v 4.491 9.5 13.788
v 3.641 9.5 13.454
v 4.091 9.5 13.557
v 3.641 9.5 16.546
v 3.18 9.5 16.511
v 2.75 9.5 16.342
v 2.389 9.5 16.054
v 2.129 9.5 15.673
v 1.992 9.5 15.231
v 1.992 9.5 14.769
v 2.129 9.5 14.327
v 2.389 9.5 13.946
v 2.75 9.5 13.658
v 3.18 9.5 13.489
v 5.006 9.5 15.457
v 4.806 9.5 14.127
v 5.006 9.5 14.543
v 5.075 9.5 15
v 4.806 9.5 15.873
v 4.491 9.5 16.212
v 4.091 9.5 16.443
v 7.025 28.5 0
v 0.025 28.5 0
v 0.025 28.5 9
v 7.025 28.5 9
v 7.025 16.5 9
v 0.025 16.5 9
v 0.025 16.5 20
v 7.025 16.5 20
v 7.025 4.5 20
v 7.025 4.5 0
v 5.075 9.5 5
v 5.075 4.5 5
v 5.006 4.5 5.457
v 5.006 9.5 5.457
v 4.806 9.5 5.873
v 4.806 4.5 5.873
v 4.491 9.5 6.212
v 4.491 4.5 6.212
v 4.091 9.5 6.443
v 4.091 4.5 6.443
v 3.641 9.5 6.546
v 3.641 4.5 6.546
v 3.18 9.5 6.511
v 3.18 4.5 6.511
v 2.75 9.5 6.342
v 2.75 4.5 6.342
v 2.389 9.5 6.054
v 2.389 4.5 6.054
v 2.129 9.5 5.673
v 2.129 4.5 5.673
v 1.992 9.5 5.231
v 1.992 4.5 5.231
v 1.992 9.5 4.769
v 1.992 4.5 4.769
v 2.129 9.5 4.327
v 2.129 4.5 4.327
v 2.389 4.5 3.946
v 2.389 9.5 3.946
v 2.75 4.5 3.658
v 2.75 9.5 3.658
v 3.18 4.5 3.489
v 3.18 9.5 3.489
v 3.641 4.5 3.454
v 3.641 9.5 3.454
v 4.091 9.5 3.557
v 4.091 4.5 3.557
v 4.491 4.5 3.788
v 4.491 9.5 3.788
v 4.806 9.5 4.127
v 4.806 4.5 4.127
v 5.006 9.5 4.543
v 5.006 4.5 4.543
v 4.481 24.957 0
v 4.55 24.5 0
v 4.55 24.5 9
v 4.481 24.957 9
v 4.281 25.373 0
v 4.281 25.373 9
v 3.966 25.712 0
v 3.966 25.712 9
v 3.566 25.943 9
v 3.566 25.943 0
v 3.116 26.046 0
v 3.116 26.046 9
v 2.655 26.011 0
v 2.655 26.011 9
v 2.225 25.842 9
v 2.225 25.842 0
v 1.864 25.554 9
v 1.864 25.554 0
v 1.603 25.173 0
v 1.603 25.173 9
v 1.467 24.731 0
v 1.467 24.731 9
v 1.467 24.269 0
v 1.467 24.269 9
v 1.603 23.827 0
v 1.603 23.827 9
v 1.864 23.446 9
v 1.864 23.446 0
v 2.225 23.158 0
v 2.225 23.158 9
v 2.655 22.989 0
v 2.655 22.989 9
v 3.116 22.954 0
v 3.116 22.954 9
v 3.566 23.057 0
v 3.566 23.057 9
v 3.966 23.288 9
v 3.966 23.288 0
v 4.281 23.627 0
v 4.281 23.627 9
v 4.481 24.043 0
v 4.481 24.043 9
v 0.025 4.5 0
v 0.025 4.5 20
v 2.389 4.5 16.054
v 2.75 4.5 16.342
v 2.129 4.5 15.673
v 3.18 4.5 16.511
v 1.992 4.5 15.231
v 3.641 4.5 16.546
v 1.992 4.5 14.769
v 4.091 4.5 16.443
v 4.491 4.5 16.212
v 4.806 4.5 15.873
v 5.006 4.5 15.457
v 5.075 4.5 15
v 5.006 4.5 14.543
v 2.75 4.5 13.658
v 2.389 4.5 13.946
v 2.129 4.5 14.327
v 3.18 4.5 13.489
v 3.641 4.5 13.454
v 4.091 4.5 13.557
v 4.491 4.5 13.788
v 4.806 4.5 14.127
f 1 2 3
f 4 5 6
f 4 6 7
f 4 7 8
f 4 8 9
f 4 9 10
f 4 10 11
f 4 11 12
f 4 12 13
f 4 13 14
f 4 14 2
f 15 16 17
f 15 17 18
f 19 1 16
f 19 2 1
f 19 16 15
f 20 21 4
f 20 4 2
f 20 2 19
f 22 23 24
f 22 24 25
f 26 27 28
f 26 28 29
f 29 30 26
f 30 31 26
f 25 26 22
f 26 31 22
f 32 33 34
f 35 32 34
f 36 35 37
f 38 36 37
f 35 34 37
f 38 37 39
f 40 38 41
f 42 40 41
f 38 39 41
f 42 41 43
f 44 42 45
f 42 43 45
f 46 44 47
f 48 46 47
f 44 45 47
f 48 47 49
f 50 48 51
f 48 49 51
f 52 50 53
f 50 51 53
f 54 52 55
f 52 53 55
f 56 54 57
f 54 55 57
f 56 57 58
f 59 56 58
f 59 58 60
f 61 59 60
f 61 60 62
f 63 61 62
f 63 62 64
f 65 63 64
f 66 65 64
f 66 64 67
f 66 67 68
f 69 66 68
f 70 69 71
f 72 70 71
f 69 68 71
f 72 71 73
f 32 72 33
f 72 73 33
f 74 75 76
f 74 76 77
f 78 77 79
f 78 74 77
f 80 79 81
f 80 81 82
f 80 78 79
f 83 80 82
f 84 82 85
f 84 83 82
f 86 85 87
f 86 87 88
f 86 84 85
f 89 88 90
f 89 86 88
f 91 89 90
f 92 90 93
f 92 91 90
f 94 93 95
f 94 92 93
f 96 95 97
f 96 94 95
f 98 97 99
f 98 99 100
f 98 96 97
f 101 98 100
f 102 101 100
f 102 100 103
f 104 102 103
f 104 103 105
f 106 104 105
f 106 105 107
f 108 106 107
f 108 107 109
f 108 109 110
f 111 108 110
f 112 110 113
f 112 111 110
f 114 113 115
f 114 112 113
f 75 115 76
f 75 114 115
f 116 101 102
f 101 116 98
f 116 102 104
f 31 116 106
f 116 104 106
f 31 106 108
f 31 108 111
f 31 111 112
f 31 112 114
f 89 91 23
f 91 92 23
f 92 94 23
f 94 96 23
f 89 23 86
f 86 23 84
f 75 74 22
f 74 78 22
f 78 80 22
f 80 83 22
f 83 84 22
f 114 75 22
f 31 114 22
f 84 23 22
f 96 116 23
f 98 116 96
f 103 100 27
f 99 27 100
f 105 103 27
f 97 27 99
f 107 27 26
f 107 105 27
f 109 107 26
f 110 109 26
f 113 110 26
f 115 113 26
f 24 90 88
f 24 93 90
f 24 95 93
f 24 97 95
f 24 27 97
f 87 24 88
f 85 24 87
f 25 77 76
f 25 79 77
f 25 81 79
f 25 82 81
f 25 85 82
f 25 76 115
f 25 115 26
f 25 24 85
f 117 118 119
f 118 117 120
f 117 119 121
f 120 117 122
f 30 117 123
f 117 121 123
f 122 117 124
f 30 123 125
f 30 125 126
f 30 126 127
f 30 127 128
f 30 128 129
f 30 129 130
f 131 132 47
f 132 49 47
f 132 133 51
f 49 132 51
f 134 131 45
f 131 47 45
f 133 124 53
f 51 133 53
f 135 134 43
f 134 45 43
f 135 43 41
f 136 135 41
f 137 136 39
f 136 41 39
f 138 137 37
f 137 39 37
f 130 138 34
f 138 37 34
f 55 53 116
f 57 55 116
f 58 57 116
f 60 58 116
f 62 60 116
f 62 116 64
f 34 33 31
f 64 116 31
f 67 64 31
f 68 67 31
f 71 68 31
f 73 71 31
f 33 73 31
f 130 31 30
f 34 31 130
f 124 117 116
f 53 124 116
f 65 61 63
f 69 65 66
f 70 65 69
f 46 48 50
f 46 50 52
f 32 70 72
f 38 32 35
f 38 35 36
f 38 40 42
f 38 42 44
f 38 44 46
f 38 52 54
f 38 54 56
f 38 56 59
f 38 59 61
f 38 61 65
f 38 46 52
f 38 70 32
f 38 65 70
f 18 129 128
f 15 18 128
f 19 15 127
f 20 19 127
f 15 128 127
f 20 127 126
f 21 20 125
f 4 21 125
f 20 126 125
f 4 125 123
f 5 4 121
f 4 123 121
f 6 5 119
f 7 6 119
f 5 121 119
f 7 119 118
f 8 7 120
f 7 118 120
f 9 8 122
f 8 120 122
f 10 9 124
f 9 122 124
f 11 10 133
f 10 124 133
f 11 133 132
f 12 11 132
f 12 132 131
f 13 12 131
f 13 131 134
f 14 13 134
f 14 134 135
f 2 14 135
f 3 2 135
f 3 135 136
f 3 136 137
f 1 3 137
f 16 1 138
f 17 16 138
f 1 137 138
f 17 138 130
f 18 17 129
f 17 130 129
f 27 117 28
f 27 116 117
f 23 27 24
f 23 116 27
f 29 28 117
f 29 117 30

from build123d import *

# Parameters (mm, degrees)
SKETCH_1_W          = 7
SKETCH_1_H          = 24
SKETCH_1_R          = 1.55
EXTRUDE_1_DEPTH     = 9
SKETCH_2_W          = 7
SKETCH_2_H          = 12
EXTRUDE_2_DEPTH     = 11
SKETCH_3_R          = 1.55
CUT_EXTRUDE_1_DEPTH = 5


with BuildPart() as part:
    # 草图1 → 凸台-拉伸1 (new body)
    with BuildSketch(Plane.XY):
        with Locations((3.525062814, 16.5)):
            Rectangle(SKETCH_1_W, SKETCH_1_H)
        with Locations((3, 24.5)):
            Circle(SKETCH_1_R, mode=Mode.SUBTRACT)
    extrude(amount=EXTRUDE_1_DEPTH)

    # 草图2 → 凸台-拉伸2 (add)
    with BuildSketch(Plane.XY.offset(9)):
        with Locations((3.525062814, 10.5)):
            Rectangle(SKETCH_2_W, SKETCH_2_H)
    extrude(amount=EXTRUDE_2_DEPTH)

    # 草图3 → 切除-拉伸1 (cut)
    with BuildSketch(Plane(origin=(0, 4.5, 0), x_dir=(-1, 0, 0), z_dir=(0, -1, 0))):
        with Locations(Location((-3.525062814, -5, 0), (0, 0, 180))):
            Circle(SKETCH_3_R)
        with Locations(Location((-3.525062814, -15, 0), (0, 0, 180))):
            Circle(SKETCH_3_R)
    extrude(amount=-CUT_EXTRUDE_1_DEPTH, mode=Mode.SUBTRACT)


solid = part.part
